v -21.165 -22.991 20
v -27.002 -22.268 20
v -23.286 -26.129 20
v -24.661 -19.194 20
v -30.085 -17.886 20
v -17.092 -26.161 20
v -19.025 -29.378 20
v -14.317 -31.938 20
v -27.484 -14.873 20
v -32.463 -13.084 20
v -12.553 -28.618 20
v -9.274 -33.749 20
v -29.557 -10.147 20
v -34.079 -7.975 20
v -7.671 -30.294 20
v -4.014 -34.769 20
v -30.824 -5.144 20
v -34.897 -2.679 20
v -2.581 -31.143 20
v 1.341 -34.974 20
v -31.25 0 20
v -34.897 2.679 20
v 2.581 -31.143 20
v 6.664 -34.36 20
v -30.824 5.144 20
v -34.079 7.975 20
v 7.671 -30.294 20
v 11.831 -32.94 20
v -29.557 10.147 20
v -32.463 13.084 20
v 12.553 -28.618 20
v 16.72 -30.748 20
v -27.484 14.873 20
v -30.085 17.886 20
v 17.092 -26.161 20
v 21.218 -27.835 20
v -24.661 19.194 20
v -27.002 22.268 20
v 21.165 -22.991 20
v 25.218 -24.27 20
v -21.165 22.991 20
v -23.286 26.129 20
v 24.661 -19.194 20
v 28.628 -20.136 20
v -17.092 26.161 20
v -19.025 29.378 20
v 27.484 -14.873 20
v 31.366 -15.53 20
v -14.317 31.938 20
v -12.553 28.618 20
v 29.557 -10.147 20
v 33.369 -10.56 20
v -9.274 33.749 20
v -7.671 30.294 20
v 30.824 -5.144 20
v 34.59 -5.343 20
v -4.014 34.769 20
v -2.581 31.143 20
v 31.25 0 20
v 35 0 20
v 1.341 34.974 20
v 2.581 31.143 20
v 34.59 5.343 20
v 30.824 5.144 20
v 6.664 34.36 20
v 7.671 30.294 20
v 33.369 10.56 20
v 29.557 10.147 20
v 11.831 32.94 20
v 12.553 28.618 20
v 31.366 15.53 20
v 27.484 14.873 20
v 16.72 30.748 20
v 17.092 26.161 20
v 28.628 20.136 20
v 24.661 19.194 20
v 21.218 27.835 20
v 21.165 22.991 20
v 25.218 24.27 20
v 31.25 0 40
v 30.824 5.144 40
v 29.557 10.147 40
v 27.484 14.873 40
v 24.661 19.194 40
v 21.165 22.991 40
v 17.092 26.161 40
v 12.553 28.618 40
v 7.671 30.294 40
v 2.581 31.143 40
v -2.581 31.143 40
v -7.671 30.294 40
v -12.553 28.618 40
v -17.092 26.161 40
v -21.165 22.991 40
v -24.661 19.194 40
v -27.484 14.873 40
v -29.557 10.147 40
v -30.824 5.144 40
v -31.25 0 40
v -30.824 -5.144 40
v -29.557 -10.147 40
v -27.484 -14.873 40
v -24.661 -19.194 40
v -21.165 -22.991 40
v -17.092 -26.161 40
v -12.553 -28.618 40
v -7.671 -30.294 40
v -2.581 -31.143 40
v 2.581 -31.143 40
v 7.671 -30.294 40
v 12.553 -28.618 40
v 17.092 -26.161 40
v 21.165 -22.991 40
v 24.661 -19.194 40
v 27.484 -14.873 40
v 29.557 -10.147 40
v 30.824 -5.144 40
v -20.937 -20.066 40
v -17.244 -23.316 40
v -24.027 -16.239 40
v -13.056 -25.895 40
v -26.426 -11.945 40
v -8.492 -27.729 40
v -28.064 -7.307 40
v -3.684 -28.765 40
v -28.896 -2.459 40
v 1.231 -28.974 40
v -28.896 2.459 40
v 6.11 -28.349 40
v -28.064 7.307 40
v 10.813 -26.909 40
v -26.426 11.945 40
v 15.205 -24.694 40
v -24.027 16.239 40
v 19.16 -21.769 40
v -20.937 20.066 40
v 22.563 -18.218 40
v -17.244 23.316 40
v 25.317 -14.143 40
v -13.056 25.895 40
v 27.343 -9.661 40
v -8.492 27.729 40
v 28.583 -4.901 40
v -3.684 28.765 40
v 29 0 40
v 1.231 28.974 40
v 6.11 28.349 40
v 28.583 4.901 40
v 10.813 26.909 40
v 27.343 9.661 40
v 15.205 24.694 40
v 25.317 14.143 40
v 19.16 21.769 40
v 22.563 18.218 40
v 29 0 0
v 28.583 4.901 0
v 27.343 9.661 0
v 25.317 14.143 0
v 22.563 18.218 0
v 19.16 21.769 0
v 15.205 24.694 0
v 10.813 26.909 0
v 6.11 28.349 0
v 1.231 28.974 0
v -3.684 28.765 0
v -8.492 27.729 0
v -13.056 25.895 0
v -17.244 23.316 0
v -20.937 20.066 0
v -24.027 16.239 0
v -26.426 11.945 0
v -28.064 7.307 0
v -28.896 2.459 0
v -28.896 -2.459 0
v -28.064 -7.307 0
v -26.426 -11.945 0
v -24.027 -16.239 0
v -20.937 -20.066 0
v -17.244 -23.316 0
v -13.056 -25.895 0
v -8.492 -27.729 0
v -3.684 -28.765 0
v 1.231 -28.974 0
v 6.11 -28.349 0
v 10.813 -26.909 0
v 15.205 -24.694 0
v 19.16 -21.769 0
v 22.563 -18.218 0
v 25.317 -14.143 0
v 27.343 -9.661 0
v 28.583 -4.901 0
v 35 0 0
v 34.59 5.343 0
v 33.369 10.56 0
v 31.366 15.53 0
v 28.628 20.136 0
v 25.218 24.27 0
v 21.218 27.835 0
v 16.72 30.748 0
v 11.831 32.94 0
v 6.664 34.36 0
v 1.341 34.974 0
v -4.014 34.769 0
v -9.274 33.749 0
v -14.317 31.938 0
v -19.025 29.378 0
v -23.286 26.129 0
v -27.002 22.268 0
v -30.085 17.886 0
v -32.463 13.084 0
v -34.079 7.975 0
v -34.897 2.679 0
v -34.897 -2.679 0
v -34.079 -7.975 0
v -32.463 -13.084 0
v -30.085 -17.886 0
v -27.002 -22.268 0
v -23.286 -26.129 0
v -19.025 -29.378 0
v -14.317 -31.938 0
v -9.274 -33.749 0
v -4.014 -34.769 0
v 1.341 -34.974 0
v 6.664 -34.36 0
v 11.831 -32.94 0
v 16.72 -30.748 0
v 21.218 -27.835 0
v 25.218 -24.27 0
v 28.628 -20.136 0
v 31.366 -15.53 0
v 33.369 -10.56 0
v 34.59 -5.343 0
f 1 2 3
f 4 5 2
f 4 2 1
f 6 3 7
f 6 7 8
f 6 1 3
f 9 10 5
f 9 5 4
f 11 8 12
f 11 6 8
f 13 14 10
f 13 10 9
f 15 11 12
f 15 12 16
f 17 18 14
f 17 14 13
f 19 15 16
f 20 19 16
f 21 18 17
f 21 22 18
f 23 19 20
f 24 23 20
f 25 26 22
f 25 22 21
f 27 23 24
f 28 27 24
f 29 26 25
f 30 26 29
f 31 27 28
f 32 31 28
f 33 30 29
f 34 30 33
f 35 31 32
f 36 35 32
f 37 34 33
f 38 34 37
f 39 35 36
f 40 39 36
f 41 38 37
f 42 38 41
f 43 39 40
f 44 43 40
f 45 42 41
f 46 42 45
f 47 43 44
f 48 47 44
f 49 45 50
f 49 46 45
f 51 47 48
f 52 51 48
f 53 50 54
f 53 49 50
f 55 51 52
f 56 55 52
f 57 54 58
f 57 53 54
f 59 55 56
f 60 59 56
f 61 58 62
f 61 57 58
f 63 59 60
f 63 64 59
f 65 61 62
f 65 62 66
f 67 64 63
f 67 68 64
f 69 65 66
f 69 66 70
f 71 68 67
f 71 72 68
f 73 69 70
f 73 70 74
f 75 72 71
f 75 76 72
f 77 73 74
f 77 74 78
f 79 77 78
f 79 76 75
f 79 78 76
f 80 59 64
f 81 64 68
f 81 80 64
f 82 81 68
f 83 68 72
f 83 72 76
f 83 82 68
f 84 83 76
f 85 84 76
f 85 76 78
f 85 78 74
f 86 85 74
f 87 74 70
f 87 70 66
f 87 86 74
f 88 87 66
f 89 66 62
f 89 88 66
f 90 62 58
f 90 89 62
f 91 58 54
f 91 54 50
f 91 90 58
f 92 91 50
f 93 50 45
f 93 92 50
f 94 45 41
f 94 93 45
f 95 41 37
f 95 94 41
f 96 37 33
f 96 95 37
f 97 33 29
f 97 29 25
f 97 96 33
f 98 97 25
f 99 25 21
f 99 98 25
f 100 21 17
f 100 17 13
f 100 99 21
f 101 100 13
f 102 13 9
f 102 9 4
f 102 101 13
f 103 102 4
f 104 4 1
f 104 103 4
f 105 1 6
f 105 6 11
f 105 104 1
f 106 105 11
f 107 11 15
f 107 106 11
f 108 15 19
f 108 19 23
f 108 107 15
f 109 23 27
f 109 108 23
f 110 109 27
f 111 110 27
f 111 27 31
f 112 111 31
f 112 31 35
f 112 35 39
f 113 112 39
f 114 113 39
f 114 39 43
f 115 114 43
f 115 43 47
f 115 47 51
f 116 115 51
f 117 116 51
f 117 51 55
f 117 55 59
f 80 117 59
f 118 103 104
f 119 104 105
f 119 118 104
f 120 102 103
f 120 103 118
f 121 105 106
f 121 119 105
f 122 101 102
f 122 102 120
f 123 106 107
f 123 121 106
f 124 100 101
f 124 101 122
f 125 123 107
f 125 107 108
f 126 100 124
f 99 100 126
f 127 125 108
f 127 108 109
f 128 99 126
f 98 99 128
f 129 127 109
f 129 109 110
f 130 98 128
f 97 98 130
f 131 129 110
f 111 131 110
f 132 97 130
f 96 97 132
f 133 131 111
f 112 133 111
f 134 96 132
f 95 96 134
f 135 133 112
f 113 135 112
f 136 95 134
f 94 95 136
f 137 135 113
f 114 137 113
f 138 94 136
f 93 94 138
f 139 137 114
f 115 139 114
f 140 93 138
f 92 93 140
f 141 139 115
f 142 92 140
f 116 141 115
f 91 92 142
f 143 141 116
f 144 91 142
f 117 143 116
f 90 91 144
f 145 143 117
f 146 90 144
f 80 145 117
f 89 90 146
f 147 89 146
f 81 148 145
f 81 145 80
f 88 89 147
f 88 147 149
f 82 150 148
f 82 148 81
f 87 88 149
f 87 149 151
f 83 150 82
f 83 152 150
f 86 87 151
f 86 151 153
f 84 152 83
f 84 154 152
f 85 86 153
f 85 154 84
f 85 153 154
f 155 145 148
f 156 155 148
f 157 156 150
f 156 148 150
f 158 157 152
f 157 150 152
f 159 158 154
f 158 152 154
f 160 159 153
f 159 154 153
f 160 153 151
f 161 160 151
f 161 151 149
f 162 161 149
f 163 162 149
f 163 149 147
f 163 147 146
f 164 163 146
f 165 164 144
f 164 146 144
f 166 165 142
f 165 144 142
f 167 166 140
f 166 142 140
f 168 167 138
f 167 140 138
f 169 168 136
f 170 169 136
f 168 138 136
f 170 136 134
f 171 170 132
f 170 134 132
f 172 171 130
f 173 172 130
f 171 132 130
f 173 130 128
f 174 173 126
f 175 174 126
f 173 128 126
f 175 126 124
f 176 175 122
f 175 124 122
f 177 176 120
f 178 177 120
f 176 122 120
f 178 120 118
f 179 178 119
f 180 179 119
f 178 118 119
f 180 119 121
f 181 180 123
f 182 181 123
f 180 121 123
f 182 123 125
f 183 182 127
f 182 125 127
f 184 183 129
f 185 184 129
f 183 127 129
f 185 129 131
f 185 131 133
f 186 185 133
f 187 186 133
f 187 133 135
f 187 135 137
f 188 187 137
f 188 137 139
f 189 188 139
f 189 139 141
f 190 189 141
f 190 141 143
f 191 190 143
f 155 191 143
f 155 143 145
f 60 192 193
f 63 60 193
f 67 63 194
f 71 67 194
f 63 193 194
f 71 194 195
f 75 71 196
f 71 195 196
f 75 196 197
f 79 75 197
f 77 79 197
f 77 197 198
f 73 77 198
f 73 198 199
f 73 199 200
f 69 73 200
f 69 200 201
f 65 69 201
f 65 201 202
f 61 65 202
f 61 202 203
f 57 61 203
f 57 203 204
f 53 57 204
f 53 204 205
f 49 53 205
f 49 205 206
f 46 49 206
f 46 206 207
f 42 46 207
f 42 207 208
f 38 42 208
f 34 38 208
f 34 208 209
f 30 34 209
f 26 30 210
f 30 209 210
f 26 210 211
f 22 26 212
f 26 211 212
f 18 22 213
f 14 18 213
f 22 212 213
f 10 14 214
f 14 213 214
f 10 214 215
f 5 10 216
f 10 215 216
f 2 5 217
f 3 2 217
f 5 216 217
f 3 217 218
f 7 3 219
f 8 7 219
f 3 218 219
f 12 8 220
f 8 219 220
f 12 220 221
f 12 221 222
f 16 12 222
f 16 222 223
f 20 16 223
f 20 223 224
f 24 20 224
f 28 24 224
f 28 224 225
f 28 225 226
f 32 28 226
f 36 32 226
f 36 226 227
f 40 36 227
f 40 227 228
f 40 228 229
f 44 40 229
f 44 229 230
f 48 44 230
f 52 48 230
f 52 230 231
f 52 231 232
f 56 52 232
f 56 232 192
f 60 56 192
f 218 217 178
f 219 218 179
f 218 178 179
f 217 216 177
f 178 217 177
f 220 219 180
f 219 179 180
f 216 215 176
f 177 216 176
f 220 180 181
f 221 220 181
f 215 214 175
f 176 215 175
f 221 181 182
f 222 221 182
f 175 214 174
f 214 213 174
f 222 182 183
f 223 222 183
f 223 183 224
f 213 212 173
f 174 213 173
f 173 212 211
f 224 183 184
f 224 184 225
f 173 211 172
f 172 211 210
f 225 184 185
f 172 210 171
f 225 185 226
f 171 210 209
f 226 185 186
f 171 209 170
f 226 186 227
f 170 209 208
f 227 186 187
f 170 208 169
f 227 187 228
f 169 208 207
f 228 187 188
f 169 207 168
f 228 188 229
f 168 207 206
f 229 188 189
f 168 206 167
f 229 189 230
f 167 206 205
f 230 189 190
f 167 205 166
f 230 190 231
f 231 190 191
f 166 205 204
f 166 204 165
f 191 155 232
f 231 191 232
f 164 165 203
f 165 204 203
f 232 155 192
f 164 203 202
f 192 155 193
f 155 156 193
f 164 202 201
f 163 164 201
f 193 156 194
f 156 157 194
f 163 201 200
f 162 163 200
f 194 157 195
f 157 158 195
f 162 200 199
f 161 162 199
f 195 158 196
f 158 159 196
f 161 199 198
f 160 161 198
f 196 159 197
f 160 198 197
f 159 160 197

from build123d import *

# Parameters (mm, degrees)
F0_R     = 35
F1_DEPTH = 40
F2_R     = 35
F2_R_2   = 31.25
F3_DEPTH = 20
F2_R_3   = 29
F4_DEPTH = 40


with BuildPart() as f1:
    # F0 (on Top) → F1 (new body)
    with BuildSketch(Plane.XY):
        Circle(F0_R)
    extrude(amount=F1_DEPTH)

    # F2 (on face) → F3 (cut)
    with BuildSketch(Plane.XY.offset(40)):
        Circle(F2_R)
        Circle(F2_R_2, mode=Mode.SUBTRACT)
    extrude(amount=-F3_DEPTH, mode=Mode.SUBTRACT)

    # F2 (on face) → F4 (cut)
    with BuildSketch(Plane.XY.offset(40)):
        Circle(F2_R_3)
    extrude(amount=-F4_DEPTH, mode=Mode.SUBTRACT)


solid = f1.part
